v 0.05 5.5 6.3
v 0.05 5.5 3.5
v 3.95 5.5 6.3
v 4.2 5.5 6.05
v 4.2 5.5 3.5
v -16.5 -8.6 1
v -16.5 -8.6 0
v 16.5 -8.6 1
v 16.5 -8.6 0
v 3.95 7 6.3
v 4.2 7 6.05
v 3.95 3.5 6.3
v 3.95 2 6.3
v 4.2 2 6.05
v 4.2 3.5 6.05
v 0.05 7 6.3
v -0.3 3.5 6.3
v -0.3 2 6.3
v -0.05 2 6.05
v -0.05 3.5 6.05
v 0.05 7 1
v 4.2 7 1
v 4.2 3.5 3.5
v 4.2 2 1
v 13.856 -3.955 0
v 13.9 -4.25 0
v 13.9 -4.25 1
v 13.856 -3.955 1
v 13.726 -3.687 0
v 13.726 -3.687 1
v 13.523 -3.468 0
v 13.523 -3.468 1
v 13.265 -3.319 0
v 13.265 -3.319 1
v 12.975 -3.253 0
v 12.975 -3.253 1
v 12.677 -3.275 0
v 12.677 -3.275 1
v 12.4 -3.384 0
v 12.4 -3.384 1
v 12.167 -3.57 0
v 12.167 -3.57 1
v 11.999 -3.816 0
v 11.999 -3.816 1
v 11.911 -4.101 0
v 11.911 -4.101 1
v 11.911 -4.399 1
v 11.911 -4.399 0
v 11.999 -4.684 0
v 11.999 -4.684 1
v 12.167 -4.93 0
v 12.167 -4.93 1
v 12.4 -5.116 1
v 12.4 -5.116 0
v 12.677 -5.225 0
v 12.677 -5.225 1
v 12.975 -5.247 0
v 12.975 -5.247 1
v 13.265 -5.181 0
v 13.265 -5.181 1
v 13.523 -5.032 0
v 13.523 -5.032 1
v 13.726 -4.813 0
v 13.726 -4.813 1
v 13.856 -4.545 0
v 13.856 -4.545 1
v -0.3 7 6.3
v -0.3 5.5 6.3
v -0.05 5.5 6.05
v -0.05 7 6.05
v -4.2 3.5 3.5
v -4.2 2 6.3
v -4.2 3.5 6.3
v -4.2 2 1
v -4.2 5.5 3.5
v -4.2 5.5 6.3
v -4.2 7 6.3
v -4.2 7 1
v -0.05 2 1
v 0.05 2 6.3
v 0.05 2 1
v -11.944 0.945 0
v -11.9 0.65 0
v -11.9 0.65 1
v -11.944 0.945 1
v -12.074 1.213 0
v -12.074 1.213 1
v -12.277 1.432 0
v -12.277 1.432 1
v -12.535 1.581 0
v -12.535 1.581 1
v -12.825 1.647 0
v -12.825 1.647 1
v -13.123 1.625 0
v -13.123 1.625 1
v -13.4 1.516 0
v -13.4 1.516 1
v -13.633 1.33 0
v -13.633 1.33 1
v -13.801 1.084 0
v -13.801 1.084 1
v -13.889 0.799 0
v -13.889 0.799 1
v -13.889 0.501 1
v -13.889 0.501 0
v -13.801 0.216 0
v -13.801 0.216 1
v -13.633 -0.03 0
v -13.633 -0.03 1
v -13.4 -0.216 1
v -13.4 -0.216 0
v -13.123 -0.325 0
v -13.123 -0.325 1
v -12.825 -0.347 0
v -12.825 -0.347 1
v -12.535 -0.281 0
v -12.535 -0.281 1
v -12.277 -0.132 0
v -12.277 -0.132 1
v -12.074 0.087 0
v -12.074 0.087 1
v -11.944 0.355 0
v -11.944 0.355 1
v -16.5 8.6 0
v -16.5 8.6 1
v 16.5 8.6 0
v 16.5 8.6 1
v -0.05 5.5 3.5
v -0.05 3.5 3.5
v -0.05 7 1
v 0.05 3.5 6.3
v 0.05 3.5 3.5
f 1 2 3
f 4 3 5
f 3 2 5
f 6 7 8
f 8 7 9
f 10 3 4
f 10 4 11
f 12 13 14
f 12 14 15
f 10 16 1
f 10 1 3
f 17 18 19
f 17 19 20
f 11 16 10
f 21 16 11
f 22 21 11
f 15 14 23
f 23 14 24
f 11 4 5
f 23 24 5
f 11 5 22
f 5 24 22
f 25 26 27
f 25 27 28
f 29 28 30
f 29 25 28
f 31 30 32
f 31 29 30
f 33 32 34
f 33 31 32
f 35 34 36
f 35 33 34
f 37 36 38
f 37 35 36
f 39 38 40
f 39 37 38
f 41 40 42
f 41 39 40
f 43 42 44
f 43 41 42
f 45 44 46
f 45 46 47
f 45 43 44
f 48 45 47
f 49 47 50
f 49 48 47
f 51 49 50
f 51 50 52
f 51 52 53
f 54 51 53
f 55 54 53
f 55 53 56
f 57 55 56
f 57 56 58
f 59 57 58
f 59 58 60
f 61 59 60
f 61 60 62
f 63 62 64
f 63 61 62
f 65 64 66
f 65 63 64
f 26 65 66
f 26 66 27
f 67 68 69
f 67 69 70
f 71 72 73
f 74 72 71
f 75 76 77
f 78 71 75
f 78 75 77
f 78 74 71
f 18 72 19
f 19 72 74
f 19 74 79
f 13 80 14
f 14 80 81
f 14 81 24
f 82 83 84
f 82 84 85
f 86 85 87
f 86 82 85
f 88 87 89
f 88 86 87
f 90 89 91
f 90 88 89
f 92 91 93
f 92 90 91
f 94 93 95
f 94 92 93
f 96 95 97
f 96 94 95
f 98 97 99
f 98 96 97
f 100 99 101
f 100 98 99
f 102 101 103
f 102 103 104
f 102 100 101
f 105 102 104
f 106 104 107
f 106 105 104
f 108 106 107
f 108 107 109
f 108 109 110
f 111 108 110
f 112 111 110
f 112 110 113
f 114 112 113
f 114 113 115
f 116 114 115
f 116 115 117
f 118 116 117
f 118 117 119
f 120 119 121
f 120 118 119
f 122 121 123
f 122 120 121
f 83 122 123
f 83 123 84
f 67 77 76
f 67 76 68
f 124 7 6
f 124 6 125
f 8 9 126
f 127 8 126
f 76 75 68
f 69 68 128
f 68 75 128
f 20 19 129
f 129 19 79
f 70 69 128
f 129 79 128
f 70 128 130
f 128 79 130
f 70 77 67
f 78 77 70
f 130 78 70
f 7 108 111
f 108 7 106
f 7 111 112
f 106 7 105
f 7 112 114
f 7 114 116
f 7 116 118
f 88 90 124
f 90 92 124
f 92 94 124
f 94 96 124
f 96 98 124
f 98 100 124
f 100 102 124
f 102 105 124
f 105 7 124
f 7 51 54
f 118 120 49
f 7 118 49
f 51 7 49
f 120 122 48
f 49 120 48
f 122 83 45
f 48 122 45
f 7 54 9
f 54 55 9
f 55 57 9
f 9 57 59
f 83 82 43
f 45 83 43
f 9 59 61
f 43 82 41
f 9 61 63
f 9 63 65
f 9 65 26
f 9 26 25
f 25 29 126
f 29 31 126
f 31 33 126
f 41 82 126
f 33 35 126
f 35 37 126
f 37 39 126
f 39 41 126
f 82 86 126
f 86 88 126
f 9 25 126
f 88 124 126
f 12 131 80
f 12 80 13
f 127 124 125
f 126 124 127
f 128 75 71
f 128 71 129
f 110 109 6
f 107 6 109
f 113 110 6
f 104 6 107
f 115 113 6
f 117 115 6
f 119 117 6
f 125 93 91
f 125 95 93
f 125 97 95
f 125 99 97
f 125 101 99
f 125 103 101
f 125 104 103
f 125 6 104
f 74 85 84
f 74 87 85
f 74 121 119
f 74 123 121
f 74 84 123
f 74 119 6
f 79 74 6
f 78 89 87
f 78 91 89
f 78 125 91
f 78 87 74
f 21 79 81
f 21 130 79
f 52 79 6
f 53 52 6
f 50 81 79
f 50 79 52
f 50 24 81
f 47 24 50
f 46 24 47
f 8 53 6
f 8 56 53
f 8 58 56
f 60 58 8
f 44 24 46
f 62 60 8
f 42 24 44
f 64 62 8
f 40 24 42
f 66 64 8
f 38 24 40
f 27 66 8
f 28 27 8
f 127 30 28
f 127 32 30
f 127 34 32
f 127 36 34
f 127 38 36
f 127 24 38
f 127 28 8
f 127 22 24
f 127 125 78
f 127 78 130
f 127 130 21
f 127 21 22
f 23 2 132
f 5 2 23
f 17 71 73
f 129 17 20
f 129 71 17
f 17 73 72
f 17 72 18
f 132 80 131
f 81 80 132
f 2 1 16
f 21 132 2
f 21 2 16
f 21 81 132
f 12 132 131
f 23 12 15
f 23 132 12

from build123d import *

# Parameters (mm, degrees)
CROQUIS1_W              = 33
CROQUIS1_H              = 17.2
CROQUIS1_R              = 1
SALIENTE_EXTRUIR1_DEPTH = 1
CROQUIS2_W              = 8.4
CROQUIS2_H              = 5
SALIENTE_EXTRUIR2_DEPTH = 2.5
CROQUIS2_5_W            = 8.4
CROQUIS2_5_H            = 1.5
SALIENTE_EXTRUIR3_DEPTH = 5.3
CORTAR_EXTRUIR1_START   = -5.3
CROQUIS3_W              = 0.1
CROQUIS3_H              = 5
CORTAR_EXTRUIR1_DEPTH   = 5.3
CHAFL_N1_SIZE           = 0.25


with BuildPart() as part:
    # Croquis1 → Saliente-Extruir1 (new body)
    with BuildSketch(Plane.XY):
        Rectangle(CROQUIS1_W, CROQUIS1_H)
        with Locations((-12.9, 0.65)):
            Circle(CROQUIS1_R, mode=Mode.SUBTRACT)
        with Locations((12.9, -4.25)):
            Circle(CROQUIS1_R, mode=Mode.SUBTRACT)
    extrude(amount=SALIENTE_EXTRUIR1_DEPTH)

    # Croquis2 → Saliente-Extruir2 (add)
    with BuildSketch(Plane.XY.offset(1)):
        with Locations((0, 4.5)):
            Rectangle(CROQUIS2_W, CROQUIS2_H)
    extrude(amount=SALIENTE_EXTRUIR2_DEPTH)

    # Croquis2<5> → Saliente-Extruir3 (add)
    with BuildSketch(Plane.XY.offset(1)):
        with Locations((0, 2.75)):
            Rectangle(CROQUIS2_5_W, CROQUIS2_5_H)
        with Locations((0, 6.25)):
            Rectangle(CROQUIS2_5_W, CROQUIS2_5_H)
    extrude(amount=SALIENTE_EXTRUIR3_DEPTH)

    # Croquis3 → Cortar-Extruir1 (cut)
    with BuildSketch(Plane.XY.offset(6.3).offset(CORTAR_EXTRUIR1_START)):
        with Locations((0, 4.5)):
            Rectangle(CROQUIS3_W, CROQUIS3_H)
    extrude(amount=CORTAR_EXTRUIR1_DEPTH, mode=Mode.SUBTRACT)

    # Chaflán1
    chafl_n1_edges = [part.edges().sort_by_distance(p)[0] for p in [
        (4.2, 2.75, 6.3),
        (4.2, 6.25, 6.3),
        (-0.05, 2.75, 6.3),
        (-0.05, 6.25, 6.3),
    ]]
    chamfer(chafl_n1_edges, length=CHAFL_N1_SIZE)


solid = part.part
